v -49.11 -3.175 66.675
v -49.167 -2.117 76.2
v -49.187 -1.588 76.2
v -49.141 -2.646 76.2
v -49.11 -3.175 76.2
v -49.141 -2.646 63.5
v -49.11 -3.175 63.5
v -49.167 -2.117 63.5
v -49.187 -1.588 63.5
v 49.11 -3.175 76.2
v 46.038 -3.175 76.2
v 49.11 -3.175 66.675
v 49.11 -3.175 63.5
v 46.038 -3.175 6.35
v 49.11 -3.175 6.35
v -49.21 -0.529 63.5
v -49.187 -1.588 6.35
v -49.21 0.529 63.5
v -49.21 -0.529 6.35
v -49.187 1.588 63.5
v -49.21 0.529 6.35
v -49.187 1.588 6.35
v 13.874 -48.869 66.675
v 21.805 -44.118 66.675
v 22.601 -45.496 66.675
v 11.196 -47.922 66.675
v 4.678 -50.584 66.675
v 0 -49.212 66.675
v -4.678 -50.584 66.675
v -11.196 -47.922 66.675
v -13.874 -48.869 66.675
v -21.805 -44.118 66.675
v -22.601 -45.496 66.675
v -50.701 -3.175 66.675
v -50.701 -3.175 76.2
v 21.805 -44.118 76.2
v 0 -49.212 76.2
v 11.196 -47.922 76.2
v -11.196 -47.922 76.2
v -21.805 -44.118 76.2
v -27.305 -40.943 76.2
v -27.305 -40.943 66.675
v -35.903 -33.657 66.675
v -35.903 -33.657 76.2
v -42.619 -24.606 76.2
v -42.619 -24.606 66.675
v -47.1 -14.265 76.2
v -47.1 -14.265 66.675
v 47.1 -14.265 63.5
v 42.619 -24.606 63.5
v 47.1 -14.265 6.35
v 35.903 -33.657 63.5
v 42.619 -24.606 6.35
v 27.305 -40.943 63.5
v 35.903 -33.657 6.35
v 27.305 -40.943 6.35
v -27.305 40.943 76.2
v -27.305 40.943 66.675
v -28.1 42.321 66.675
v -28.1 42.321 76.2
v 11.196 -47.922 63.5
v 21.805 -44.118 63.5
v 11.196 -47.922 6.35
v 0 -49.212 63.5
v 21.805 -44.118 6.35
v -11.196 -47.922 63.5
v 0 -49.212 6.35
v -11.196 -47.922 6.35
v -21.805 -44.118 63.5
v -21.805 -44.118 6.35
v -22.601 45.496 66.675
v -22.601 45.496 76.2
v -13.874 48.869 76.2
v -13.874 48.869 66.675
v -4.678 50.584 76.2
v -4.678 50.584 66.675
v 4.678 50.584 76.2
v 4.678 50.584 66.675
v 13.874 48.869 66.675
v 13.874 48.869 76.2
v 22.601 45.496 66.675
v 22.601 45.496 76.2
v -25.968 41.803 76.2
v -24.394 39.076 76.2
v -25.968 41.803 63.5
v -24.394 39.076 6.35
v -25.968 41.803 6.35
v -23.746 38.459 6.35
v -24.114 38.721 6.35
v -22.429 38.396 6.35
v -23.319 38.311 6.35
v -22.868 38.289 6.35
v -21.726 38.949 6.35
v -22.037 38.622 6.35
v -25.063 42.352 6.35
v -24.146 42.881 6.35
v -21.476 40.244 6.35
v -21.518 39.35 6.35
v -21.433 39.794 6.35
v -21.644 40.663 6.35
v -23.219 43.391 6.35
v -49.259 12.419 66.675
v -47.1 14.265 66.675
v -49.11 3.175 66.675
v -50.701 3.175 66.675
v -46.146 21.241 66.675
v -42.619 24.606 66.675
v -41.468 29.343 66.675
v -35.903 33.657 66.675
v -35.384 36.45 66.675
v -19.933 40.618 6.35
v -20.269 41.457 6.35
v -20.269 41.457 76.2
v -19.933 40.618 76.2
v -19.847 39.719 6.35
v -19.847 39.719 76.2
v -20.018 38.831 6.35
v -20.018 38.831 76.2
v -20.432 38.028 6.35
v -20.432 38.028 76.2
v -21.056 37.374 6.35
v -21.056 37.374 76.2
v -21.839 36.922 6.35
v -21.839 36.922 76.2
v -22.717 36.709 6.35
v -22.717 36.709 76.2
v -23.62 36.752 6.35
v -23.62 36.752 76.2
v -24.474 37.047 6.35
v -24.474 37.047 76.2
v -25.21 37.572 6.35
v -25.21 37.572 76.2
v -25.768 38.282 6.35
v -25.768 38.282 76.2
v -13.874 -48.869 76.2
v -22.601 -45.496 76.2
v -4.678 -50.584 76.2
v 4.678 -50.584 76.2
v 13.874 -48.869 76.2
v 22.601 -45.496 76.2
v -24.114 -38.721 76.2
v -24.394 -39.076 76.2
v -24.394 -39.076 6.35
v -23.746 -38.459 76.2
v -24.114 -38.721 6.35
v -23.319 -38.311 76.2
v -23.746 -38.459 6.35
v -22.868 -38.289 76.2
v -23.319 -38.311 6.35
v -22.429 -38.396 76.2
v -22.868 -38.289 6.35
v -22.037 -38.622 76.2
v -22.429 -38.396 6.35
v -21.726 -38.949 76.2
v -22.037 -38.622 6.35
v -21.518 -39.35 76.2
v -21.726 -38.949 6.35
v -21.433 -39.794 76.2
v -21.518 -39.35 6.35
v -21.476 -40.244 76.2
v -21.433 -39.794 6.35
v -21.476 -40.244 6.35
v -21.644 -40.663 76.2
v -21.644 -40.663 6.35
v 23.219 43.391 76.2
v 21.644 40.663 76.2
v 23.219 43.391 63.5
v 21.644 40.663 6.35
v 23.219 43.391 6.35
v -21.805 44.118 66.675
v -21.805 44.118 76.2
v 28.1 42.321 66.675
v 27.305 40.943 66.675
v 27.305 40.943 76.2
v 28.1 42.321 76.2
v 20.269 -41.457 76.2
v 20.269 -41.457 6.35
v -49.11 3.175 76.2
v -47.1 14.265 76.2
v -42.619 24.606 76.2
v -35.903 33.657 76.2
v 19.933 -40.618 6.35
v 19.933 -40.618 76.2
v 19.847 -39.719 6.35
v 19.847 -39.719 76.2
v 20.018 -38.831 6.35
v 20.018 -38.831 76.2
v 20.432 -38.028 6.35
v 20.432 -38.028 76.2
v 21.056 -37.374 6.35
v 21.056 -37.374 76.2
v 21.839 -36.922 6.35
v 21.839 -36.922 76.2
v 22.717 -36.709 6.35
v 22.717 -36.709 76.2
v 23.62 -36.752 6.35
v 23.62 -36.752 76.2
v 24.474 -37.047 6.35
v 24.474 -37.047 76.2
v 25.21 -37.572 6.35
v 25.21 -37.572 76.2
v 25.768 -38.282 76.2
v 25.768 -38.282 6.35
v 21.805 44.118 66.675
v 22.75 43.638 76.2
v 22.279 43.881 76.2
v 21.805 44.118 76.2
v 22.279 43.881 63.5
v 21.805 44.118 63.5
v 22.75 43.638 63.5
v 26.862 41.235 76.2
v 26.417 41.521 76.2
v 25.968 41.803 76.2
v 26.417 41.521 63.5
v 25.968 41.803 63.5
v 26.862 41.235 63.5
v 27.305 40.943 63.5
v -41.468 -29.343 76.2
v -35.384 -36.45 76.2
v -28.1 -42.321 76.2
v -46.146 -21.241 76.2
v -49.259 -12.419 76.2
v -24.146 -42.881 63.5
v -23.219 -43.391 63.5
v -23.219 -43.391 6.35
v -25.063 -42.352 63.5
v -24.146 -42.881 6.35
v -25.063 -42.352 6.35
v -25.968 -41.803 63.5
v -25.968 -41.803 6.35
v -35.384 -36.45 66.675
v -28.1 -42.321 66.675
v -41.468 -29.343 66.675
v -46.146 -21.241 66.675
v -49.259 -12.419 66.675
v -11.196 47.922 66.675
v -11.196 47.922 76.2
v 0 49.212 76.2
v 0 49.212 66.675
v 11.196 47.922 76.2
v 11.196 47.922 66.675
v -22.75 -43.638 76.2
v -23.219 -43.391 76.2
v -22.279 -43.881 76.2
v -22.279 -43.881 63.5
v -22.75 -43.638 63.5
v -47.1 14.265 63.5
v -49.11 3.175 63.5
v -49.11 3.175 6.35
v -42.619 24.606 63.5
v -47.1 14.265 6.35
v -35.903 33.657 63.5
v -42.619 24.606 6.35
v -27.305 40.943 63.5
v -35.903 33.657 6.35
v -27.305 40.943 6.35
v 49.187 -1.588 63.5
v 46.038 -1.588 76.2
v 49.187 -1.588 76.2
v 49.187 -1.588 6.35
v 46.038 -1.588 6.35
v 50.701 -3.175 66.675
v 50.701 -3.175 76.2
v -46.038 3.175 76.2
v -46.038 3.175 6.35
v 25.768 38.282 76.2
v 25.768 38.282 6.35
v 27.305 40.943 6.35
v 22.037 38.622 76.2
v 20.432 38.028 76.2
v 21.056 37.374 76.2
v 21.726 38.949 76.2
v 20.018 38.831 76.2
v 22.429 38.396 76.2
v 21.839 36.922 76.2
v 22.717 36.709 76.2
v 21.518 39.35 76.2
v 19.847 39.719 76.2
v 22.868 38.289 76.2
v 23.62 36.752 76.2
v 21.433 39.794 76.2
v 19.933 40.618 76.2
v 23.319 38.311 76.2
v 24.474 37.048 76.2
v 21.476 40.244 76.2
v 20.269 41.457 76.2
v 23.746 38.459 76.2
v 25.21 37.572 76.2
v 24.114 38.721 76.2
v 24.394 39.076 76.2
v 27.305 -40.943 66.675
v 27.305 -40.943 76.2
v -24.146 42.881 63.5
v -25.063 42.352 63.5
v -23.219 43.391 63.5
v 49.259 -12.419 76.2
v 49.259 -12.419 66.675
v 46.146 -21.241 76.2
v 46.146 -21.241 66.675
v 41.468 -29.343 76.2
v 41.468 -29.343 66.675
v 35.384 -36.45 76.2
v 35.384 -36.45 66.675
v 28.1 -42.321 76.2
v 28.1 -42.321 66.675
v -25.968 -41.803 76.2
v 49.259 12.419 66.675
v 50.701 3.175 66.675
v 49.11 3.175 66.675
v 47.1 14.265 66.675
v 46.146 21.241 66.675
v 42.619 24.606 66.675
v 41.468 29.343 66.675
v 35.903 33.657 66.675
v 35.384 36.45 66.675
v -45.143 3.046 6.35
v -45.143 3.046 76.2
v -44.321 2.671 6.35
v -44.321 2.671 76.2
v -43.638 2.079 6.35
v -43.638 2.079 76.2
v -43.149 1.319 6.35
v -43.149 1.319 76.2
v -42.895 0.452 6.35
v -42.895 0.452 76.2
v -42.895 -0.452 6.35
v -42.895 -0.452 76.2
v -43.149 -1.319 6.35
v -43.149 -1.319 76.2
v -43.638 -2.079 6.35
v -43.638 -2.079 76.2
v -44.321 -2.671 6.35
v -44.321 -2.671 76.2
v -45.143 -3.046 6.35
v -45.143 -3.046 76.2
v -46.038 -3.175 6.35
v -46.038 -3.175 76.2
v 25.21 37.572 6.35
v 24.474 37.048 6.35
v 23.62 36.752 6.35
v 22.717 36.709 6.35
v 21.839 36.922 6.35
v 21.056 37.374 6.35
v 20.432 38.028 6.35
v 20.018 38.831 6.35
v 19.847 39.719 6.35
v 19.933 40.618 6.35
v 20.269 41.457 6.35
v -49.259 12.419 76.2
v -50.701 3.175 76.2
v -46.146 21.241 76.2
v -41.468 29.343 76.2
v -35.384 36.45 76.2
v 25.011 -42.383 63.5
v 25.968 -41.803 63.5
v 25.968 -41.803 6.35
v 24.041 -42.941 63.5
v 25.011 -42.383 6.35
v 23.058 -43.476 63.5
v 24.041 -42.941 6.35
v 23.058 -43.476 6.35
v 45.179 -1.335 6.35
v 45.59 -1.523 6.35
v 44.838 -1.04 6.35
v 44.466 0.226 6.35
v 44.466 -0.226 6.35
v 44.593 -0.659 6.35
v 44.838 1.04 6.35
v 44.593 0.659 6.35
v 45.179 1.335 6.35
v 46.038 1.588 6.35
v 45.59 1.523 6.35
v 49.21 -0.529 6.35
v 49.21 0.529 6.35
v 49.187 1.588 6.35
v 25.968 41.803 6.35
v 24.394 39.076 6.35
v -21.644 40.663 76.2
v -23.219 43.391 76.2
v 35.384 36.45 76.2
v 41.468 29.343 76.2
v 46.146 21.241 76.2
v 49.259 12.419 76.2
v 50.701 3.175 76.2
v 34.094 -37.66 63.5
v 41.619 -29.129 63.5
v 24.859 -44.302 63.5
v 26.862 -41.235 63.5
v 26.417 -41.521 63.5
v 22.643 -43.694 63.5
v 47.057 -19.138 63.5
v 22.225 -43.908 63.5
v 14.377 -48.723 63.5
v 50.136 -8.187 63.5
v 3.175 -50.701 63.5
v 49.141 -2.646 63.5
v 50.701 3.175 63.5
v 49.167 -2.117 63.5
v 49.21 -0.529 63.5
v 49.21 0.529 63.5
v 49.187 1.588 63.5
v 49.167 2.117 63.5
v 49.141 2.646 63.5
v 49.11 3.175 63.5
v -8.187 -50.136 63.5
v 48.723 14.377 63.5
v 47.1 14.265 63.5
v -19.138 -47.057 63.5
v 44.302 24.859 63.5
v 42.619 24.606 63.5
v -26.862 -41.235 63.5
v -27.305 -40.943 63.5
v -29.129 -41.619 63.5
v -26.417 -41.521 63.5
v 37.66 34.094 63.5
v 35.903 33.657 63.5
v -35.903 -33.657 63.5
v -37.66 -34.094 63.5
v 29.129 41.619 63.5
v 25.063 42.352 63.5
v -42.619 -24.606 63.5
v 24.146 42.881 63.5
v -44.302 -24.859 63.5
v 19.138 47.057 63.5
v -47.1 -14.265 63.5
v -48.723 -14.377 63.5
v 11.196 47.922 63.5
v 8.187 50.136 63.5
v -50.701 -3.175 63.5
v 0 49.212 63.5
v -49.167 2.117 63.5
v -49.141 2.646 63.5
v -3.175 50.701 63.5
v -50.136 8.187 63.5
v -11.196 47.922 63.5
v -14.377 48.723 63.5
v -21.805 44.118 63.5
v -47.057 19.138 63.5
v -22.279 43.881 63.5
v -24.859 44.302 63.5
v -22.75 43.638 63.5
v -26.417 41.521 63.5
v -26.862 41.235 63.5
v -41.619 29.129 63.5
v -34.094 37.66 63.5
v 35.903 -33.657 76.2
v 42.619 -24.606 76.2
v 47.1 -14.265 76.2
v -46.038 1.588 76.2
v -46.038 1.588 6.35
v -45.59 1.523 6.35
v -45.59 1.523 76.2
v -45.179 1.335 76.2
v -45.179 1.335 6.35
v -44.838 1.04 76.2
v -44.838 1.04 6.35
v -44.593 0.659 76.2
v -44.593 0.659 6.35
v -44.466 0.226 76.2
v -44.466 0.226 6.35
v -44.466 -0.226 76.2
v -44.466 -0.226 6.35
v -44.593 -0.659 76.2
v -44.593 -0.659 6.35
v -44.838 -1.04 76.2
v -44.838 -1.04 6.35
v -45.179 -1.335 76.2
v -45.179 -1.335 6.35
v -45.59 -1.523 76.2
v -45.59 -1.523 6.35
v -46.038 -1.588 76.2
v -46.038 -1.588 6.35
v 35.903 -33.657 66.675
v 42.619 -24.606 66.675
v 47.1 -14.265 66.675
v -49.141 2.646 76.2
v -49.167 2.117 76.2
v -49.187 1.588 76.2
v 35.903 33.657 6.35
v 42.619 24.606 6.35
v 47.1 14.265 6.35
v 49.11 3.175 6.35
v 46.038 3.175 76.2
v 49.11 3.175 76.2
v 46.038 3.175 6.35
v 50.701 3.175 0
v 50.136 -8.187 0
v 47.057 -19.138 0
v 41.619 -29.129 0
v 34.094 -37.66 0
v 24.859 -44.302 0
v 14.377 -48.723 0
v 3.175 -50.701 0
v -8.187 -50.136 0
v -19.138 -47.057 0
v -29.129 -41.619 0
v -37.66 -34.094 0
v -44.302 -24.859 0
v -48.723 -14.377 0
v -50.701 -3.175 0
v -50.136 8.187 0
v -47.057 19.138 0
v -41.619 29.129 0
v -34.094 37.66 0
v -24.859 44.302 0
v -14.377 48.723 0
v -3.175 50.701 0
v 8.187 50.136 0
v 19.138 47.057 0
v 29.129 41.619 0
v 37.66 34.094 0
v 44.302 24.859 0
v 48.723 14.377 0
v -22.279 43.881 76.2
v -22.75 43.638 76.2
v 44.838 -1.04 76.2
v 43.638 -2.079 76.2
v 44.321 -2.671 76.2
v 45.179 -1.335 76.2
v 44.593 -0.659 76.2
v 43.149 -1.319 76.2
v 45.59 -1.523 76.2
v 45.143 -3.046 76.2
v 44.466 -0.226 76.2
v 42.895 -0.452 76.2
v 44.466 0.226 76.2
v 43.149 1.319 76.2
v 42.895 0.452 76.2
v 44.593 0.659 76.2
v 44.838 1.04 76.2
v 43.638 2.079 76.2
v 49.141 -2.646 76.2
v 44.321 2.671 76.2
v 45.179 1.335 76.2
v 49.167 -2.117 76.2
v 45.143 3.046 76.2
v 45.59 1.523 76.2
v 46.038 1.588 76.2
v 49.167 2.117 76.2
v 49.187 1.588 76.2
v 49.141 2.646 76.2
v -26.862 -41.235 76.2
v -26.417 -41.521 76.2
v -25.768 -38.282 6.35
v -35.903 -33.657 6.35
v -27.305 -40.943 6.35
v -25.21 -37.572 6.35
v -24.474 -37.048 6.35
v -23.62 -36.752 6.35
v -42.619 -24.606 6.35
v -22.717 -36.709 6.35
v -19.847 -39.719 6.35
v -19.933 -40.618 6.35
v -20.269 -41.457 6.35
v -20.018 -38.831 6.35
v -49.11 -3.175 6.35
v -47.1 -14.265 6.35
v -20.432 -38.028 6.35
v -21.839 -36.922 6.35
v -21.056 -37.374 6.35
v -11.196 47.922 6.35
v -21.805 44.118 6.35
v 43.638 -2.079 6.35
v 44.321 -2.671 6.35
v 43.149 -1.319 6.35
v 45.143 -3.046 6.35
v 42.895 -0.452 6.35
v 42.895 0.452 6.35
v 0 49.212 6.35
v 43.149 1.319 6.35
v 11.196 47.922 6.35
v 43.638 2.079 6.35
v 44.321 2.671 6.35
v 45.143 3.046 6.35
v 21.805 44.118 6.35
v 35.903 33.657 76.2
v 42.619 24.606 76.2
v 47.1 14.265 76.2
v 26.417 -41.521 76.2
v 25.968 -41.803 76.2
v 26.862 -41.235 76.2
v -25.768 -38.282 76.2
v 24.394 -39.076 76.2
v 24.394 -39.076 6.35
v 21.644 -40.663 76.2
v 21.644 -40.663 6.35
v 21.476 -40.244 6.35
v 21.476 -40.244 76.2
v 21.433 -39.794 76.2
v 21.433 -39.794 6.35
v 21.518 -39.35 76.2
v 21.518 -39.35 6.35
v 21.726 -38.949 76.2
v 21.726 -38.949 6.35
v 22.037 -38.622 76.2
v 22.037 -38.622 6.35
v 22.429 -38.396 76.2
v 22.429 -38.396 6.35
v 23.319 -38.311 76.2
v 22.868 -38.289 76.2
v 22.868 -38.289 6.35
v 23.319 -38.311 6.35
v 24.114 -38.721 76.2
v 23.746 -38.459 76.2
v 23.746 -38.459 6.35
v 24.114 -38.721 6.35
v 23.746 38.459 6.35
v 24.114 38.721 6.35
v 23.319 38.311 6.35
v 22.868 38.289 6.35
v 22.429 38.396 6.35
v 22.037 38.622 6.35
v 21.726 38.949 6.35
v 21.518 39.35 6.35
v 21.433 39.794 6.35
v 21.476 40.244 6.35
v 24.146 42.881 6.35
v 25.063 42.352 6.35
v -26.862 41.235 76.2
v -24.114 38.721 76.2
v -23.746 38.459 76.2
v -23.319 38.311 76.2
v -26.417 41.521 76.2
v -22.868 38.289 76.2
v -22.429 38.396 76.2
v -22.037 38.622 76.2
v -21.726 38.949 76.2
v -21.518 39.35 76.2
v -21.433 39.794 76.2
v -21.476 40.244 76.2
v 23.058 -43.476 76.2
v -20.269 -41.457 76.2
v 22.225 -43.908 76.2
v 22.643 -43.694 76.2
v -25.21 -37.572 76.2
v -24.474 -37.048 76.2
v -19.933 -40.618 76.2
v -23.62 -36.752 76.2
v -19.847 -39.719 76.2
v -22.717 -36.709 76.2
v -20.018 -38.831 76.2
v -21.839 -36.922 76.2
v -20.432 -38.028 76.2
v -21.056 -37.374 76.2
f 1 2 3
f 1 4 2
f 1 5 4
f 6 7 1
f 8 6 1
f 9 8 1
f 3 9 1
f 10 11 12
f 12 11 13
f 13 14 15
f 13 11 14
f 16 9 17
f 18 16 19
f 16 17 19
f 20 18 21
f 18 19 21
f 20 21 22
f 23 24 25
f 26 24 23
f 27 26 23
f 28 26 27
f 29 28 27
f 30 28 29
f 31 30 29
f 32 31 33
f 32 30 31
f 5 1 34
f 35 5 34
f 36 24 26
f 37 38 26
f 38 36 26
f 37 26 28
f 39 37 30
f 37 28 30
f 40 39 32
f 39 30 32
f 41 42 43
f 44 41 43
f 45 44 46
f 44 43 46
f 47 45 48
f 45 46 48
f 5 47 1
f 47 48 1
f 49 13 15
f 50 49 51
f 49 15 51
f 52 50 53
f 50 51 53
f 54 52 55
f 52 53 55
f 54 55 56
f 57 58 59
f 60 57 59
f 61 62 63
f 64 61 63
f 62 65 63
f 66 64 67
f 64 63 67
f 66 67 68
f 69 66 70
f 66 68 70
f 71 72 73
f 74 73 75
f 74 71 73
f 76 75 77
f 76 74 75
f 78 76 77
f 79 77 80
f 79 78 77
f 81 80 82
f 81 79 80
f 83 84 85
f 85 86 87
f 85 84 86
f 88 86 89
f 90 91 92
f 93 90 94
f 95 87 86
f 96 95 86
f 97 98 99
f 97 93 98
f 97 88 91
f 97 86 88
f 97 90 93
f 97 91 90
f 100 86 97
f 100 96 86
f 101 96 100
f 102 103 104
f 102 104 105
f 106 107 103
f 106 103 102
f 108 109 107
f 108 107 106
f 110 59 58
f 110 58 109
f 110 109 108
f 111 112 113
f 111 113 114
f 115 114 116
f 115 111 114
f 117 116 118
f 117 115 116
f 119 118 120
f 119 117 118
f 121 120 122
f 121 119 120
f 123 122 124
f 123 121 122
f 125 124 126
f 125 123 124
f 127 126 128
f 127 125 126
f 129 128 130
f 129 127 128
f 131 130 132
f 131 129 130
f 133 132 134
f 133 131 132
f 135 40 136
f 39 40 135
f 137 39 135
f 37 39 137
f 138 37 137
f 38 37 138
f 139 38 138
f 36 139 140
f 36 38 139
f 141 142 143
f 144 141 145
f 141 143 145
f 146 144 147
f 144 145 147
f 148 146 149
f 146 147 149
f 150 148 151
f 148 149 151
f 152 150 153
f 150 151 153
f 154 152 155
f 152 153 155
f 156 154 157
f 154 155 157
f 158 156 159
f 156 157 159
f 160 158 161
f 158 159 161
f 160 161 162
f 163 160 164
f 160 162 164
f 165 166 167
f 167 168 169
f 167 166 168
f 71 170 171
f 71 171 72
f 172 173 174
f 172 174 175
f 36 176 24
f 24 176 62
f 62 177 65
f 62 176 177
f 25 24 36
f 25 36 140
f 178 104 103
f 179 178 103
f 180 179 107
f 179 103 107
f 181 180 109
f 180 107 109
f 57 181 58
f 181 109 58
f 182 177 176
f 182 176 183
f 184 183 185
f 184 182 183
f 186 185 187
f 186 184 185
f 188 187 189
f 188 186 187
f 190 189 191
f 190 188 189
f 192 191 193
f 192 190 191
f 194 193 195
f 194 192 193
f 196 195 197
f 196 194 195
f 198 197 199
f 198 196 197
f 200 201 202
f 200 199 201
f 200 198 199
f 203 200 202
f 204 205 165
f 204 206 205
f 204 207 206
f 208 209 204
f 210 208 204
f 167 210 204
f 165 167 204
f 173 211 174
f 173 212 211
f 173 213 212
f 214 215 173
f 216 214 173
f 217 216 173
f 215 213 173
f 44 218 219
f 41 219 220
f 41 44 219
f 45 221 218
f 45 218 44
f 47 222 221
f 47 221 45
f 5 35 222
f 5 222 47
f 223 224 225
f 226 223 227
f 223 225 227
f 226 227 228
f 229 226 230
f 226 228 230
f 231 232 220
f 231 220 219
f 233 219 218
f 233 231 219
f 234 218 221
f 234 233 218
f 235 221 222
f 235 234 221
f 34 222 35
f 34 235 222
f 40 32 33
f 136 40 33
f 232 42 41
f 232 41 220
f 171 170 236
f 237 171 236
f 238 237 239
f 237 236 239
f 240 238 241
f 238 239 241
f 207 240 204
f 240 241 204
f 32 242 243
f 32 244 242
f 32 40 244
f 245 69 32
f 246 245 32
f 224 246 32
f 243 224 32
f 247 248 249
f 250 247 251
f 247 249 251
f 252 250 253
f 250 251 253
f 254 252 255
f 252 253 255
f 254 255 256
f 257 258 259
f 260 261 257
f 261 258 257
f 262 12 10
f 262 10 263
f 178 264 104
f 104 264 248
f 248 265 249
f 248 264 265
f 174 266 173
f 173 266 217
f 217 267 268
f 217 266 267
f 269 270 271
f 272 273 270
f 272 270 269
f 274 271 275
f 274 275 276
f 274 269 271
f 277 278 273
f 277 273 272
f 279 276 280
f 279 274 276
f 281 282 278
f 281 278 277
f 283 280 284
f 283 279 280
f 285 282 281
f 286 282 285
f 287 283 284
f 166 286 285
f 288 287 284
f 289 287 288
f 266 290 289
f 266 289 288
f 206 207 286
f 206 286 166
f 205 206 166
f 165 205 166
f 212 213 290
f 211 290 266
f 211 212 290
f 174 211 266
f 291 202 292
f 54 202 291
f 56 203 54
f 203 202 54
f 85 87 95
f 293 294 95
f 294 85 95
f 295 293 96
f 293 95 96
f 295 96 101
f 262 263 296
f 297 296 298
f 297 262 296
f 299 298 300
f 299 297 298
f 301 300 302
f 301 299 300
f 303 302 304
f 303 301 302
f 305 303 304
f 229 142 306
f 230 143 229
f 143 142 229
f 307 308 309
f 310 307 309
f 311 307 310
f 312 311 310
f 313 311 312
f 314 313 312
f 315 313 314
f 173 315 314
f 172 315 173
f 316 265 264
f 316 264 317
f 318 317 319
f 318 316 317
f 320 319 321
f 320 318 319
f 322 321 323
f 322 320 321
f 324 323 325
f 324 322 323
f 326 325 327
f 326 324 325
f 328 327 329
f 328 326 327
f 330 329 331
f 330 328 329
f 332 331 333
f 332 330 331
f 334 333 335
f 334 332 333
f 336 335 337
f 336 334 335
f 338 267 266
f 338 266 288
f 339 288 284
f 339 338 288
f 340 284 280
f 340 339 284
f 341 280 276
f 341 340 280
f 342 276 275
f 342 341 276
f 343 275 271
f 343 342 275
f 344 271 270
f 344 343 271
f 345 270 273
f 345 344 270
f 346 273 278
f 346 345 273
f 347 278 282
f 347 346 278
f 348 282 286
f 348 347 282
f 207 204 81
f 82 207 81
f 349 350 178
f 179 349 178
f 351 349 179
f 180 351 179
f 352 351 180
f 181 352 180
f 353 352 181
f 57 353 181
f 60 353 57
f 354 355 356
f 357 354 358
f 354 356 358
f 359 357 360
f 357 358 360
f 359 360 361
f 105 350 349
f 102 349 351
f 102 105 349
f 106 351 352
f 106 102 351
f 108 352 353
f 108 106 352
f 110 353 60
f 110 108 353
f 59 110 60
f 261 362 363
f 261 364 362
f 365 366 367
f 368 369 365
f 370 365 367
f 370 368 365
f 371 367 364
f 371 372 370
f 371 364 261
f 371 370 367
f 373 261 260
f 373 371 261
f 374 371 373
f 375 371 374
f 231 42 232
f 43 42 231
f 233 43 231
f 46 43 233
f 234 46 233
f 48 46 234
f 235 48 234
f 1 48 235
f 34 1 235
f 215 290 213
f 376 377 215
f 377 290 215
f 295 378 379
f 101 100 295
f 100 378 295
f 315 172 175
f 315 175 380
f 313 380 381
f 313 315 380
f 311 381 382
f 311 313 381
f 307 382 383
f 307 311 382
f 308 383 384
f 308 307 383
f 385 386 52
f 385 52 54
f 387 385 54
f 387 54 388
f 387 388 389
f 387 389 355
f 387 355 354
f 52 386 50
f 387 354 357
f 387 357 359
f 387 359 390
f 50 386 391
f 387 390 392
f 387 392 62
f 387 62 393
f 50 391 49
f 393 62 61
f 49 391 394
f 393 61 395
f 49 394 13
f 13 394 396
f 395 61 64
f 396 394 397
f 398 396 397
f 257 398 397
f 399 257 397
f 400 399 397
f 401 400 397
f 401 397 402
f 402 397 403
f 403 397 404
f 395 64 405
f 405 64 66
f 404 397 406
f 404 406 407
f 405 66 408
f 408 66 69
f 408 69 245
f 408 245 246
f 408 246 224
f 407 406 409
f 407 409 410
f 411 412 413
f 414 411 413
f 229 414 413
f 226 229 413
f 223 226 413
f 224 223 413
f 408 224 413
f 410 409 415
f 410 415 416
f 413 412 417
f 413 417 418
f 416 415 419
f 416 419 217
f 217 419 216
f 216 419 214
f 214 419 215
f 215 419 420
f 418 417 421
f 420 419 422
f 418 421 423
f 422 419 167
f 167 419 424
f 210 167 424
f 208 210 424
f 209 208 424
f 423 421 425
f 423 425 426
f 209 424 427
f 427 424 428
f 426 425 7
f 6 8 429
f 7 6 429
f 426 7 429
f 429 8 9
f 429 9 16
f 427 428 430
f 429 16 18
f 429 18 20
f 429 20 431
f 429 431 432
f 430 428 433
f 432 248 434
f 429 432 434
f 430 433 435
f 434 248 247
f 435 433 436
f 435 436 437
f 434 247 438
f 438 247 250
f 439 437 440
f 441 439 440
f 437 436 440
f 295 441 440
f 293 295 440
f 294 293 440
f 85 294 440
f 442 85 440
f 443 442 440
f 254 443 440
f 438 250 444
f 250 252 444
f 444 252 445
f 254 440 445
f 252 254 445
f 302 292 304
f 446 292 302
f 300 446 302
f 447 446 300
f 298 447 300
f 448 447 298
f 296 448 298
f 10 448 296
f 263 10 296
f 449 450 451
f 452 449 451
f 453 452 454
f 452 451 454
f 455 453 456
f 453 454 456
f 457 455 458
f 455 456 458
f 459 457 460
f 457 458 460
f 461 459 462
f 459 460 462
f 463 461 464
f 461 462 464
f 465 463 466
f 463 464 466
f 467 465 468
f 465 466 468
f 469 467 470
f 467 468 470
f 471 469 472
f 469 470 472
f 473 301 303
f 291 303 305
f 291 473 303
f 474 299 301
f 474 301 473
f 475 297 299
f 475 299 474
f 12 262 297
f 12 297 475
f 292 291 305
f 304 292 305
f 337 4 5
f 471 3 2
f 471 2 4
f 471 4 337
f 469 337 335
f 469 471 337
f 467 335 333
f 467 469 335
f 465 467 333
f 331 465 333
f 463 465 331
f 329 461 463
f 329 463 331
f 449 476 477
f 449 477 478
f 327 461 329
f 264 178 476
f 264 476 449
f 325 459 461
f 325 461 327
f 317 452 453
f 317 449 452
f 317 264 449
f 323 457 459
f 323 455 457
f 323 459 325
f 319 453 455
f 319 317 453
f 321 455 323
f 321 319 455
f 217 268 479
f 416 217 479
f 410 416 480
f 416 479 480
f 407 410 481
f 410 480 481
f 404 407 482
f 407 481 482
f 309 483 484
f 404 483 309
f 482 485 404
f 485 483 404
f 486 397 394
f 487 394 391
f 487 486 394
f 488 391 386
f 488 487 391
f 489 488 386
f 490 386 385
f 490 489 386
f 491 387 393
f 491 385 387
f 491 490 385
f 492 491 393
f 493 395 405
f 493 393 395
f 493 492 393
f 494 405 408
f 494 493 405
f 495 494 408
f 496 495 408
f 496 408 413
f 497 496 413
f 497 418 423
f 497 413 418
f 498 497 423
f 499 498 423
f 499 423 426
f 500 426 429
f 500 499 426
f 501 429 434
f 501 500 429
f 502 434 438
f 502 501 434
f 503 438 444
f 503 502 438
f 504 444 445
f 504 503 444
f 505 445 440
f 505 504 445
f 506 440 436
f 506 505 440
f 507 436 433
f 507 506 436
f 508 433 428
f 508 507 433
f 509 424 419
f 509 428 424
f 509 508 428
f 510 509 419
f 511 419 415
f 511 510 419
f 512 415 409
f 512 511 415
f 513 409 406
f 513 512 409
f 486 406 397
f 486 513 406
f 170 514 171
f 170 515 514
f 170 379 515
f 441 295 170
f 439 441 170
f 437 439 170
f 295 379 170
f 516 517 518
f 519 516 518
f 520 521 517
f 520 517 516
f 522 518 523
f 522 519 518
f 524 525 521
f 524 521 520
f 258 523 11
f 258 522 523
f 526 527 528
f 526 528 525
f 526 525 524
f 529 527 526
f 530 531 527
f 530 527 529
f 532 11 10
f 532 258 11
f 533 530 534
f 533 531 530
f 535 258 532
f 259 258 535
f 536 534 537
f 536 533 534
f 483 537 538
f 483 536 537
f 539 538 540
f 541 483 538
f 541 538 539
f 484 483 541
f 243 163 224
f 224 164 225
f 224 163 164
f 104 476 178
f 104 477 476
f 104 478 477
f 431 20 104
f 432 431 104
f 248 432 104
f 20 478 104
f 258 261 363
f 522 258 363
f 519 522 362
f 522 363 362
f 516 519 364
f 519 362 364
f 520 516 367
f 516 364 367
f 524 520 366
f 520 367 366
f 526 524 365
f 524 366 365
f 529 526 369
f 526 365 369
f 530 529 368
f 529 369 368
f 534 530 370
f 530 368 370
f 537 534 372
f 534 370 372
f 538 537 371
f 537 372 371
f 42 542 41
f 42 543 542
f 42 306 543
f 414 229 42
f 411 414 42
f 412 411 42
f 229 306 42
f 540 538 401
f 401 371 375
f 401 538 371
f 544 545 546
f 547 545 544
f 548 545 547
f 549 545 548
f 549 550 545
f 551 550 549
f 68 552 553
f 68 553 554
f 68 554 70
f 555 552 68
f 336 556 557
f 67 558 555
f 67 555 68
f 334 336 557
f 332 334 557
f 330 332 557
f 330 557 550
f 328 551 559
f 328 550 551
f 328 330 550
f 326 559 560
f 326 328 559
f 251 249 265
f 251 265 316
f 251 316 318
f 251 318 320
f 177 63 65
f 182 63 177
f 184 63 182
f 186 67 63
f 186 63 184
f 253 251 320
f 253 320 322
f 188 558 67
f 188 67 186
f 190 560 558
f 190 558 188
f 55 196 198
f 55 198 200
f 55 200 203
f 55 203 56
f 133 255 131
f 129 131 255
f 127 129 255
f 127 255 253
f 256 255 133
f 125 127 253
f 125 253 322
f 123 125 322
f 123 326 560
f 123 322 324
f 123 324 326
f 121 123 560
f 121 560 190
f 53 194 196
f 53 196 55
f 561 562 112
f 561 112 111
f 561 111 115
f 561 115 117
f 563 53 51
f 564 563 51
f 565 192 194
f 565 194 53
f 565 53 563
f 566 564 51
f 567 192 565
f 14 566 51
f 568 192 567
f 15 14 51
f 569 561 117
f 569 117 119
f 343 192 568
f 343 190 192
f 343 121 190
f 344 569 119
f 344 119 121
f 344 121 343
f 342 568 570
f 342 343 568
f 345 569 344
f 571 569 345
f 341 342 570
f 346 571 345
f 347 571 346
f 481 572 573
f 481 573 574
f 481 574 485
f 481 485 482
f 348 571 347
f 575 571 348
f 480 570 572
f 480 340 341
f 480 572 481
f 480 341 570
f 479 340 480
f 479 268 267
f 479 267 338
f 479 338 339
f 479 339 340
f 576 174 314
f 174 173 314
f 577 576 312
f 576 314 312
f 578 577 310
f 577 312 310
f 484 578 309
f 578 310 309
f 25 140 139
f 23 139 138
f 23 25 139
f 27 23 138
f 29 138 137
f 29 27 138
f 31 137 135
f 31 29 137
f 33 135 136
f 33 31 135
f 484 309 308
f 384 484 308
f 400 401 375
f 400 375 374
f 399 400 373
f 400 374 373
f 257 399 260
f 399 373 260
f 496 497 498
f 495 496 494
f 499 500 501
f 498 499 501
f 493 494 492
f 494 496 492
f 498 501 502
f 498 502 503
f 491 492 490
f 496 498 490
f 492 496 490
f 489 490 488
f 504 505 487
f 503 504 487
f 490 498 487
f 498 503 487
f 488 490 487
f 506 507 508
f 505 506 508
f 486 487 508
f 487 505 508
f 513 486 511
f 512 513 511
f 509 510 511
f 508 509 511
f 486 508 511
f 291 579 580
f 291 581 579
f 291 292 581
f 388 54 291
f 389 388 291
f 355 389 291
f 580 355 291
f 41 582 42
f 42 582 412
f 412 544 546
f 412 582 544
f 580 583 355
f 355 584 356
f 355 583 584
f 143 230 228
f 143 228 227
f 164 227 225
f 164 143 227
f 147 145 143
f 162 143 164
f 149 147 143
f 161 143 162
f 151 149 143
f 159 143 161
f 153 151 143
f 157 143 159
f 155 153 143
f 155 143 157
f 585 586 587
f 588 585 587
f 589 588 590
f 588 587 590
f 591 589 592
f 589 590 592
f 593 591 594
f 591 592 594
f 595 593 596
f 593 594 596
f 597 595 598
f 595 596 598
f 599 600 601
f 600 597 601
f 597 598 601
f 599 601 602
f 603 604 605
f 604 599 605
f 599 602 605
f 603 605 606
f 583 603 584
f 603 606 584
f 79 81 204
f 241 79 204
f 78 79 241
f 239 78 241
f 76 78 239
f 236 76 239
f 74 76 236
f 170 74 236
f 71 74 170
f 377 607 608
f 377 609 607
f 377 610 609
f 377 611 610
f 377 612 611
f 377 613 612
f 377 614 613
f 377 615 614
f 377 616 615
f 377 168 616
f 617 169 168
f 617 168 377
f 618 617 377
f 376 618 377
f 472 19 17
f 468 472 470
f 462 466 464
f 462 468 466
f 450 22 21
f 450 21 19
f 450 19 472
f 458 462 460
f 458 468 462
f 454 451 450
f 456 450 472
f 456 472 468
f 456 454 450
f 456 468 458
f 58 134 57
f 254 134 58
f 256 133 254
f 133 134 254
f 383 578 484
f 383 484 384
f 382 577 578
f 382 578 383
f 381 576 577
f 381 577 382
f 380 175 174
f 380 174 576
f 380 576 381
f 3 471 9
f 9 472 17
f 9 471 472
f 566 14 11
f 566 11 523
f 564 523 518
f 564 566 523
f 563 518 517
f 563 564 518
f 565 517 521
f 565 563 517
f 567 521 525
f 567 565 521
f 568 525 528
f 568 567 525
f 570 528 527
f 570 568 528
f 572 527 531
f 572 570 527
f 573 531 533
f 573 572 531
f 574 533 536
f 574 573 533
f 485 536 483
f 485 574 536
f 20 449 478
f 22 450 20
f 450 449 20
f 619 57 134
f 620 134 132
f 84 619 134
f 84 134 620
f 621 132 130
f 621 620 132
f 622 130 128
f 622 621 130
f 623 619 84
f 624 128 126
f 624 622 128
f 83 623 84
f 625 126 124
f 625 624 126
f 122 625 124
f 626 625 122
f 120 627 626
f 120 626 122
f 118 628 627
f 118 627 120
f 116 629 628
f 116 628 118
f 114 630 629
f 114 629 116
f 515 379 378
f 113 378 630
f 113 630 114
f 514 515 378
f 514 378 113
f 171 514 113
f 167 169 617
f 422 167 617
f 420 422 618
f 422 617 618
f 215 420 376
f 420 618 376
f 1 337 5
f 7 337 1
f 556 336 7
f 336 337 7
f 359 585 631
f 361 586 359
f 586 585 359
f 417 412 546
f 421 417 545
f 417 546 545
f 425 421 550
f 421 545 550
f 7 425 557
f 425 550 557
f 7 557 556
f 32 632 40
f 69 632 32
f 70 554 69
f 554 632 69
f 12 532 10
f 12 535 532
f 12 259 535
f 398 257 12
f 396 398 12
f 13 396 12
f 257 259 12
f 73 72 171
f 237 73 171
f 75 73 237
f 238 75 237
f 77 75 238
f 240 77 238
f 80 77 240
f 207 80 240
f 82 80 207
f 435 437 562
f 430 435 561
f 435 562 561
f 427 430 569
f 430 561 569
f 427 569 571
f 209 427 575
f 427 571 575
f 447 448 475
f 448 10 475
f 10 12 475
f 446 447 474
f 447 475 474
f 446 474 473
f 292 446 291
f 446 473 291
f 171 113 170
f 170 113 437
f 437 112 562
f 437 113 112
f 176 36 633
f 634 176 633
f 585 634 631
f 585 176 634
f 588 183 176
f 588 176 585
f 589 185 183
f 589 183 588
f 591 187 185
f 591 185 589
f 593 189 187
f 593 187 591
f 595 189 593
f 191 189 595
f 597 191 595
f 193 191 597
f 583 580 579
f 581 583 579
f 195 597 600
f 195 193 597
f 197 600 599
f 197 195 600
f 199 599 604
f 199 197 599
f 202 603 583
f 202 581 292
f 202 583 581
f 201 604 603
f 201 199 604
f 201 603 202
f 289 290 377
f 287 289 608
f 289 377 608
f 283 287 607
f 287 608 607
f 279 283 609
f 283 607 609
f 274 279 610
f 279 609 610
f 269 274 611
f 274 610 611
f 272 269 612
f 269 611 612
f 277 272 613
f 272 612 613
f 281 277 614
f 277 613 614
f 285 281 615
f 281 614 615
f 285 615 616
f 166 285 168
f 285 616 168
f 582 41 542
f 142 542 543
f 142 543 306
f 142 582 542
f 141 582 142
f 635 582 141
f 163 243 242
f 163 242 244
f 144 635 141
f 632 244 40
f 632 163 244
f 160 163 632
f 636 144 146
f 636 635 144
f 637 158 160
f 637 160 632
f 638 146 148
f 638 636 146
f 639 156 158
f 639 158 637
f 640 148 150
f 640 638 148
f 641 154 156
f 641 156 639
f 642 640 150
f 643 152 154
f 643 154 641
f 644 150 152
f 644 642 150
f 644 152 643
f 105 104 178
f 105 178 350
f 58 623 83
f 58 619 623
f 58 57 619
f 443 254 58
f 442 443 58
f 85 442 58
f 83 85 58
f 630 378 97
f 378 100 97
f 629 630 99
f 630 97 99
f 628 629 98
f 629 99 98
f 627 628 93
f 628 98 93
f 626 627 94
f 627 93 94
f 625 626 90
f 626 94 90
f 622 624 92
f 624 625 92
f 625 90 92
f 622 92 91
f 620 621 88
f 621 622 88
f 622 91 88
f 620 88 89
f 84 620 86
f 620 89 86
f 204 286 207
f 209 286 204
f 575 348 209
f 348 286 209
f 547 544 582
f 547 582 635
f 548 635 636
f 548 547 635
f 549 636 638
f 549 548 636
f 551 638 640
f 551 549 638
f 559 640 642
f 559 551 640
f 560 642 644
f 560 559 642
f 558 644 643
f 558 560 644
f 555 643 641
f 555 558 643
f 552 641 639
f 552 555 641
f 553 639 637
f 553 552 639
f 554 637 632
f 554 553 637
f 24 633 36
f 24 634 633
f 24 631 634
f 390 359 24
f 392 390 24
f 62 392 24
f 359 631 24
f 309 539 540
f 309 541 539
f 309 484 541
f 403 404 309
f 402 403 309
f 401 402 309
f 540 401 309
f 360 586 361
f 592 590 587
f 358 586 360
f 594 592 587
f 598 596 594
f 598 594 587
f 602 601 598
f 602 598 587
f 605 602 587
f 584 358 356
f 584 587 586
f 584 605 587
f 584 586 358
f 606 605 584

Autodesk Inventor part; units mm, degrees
ref_plane "YZ Plane" through (0, 0, 0) normal (1, 0, 0) x (0, 1, 0)
ref_plane "XZ Plane" through (0, 0, 0) normal (0, 1, 0) x (-1, 0, 0)
ref_plane "XY Plane" through (0, 0, 0) normal (0, 0, 1) x (1, 0, 0)
sketch "Sketch1" plane through (0, 0, 0) normal (0, 0, 1) x (1, 0, 0)
  circle A0 centre (0, 0) radius 50.8
  circle A1 centre (0, 0) radius 49.2125
  line L0 (49.2125, 0) -> (46.0375, 0)
  arc A2 (46.0375, 3.175) -> (46.0375, -3.175) centre (46.0375, 0) ccw
  arc A3 (46.0375, 1.5875) -> (46.0375, -1.5875) centre (46.0375, 0) ccw
  line L1 (46.0375, -3.175) -> (50.7007, -3.175)
  line L2 (46.0375, 3.175) -> (50.7007, 3.175)
  line L3 (46.0375, 1.5875) -> (49.1869, 1.5875)
  line L4 (46.0375, -1.5875) -> (49.1869, -1.5875)
  line L5 (20.2691, 41.4571) -> (22.6007, 45.4956)
  arc A4 (20.2691, 41.4571) -> (25.7684, 38.2821) centre (23.0188, 39.8696) ccw
  line L6 (21.6439, 40.6634) -> (23.2186, 43.3908)
  arc A5 (21.6439, 40.6634) -> (24.3936, 39.0759) centre (23.0188, 39.8696) ccw
  line L7 (25.7684, 38.2821) -> (28.1, 42.3206)
  line L8 (-25.7684, 38.2821) -> (-28.1, 42.3206)
  arc A6 (-25.7684, 38.2821) -> (-20.2691, 41.4571) centre (-23.0187, 39.8696) ccw
  line L9 (-24.3936, 39.0759) -> (-25.9683, 41.8033)
  arc A7 (-24.3936, 39.0759) -> (-21.6439, 40.6634) centre (-23.0187, 39.8696) ccw
  line L10 (-20.2691, 41.4571) -> (-22.6007, 45.4956)
  line L11 (-46.0375, -3.175) -> (-50.7007, -3.175)
  arc A8 (-46.0375, -3.175) -> (-46.0375, 3.175) centre (-46.0375, 0) ccw
  line L12 (-46.0375, -1.5875) -> (-49.1869, -1.5875)
  arc A9 (-46.0375, -1.5875) -> (-46.0375, 1.5875) centre (-46.0375, 0) ccw
  line L13 (-46.0375, 3.175) -> (-50.7007, 3.175)
  line L14 (-20.2691, -41.4571) -> (-22.6007, -45.4956)
  arc A10 (-20.2691, -41.4571) -> (-25.7684, -38.2821) centre (-23.0188, -39.8696) ccw
  line L15 (-21.6439, -40.6634) -> (-23.2186, -43.3908)
  arc A11 (-21.6439, -40.6634) -> (-24.3936, -39.0759) centre (-23.0188, -39.8696) ccw
  line L16 (-25.7684, -38.2821) -> (-28.1, -42.3206)
  line L17 (25.7684, -38.2821) -> (28.1, -42.3206)
  arc A12 (25.7684, -38.2821) -> (20.2691, -41.4571) centre (23.0187, -39.8696) ccw
  line L18 (24.3936, -39.0759) -> (25.9683, -41.8033)
  arc A13 (24.3936, -39.0759) -> (21.6439, -40.6634) centre (23.0187, -39.8696) ccw
  line L19 (20.2691, -41.4571) -> (22.6007, -45.4956)
  line L20 (-46.0375, 1.5875) -> (-49.1869, 1.5875)
  line L21 (-21.6439, 40.6634) -> (-23.2186, 43.3908)
  line L22 (24.3936, 39.0759) -> (25.9683, 41.8033)
  line L23 (21.6439, -40.6634) -> (23.0583, -43.4763)
  line L24 (-24.3936, -39.0759) -> (-25.9683, -41.8033)
  point P0 (49.11, -3.175)
  point P1 (49.11, 3.175)
  point P2 (-49.11, 3.175)
  point P3 (-27.3046, 40.943)
  point P4 (-21.8054, 44.118)
  point P5 (21.8054, 44.118)
  point P6 (-27.3046, -40.943)
  point P7 (-49.11, -3.175)
  point P8 (21.8054, -44.118)
  point P9 (-21.8054, -44.118)
  point P10 (27.3046, -40.943)
  point P11 (27.3046, 40.943)
  dimension "d1" = 98.425
  dimension "d0" = 101.6
  dimension "d6" = 3.175
  dimension "d7" = 3.175
  dimension "d24" = 360
extrude "Extrusion1" add sketch "Sketch1" along normal blind 6.35 contours L2 A2 L1 A1 L17 A12 L19 L14 A10 L16 L11 A8 L13 L8 A6 L10 L5 A4 L7 | A1 L3 A3 L4 L1 A2 L2 | L7 A4 L5 A1 L6 A5 L22 | A1 L4 A3 L3 | A1 L18 A13 L23 L19 A12 L17 | L22 A5 L6 A1 | A1 L23 A13 L18 | L10 A6 L8 A1 L9 A7 L21 | A1 L15 A11 L24 L16 A10 L14 | L21 A7 L9 A1 | A1 L24 A11 L15 | L13 A8 L11 A1 L12 A9 L20 | L20 A9 L12 A1
extrude "Extrusion6" add sketch "Sketch1" along normal blind 76.2 contours L2 A1 L7 A0 | A0 L17 A1 L1 | L5 A1 L10 A0 | A0 L14 A1 L19 | L8 A1 L13 A0 | A0 L11 A1 L16
extrude "Extrusion7" add sketch "Sketch1" along normal blind 63.5 contours A0 L1 A1 L2 | L7 A1 L5 A0 | A0 L19 A1 L17 | L10 A1 L8 A0 | A0 L16 A1 L14 | L13 A1 L11 A0
extrude "Extrusion8" add sketch "Sketch1" along normal blind 76.2 contours A1 L3 A3 L4 L1 A2 L2 | L7 A4 L5 A1 L6 A5 L22 | A1 L18 A13 L23 L19 A12 L17 | L10 A6 L8 A1 L9 A7 L21 | A1 L15 A11 L24 L16 A10 L14 | L13 A8 L11 A1 L12 A9 L20
ref_plane "Work Plane1" through (0, 0, 66.675) normal (0, 0, -1) x (-1, 0, 0)
sketch "Sketch2" plane through (0, 0, 66.675) normal (0, 0, -1) x (-1, 0, 0)
  circle A0 centre (0, 0) radius 50.8
  circle A1 centre (0, 0) radius 49.2125
  dimension "d33" = 101.6
  dimension "d34" = 98.425
extrude "Extrusion9" cut sketch "Sketch2" along normal blind 3.175
properties part number "Main Iris box"
